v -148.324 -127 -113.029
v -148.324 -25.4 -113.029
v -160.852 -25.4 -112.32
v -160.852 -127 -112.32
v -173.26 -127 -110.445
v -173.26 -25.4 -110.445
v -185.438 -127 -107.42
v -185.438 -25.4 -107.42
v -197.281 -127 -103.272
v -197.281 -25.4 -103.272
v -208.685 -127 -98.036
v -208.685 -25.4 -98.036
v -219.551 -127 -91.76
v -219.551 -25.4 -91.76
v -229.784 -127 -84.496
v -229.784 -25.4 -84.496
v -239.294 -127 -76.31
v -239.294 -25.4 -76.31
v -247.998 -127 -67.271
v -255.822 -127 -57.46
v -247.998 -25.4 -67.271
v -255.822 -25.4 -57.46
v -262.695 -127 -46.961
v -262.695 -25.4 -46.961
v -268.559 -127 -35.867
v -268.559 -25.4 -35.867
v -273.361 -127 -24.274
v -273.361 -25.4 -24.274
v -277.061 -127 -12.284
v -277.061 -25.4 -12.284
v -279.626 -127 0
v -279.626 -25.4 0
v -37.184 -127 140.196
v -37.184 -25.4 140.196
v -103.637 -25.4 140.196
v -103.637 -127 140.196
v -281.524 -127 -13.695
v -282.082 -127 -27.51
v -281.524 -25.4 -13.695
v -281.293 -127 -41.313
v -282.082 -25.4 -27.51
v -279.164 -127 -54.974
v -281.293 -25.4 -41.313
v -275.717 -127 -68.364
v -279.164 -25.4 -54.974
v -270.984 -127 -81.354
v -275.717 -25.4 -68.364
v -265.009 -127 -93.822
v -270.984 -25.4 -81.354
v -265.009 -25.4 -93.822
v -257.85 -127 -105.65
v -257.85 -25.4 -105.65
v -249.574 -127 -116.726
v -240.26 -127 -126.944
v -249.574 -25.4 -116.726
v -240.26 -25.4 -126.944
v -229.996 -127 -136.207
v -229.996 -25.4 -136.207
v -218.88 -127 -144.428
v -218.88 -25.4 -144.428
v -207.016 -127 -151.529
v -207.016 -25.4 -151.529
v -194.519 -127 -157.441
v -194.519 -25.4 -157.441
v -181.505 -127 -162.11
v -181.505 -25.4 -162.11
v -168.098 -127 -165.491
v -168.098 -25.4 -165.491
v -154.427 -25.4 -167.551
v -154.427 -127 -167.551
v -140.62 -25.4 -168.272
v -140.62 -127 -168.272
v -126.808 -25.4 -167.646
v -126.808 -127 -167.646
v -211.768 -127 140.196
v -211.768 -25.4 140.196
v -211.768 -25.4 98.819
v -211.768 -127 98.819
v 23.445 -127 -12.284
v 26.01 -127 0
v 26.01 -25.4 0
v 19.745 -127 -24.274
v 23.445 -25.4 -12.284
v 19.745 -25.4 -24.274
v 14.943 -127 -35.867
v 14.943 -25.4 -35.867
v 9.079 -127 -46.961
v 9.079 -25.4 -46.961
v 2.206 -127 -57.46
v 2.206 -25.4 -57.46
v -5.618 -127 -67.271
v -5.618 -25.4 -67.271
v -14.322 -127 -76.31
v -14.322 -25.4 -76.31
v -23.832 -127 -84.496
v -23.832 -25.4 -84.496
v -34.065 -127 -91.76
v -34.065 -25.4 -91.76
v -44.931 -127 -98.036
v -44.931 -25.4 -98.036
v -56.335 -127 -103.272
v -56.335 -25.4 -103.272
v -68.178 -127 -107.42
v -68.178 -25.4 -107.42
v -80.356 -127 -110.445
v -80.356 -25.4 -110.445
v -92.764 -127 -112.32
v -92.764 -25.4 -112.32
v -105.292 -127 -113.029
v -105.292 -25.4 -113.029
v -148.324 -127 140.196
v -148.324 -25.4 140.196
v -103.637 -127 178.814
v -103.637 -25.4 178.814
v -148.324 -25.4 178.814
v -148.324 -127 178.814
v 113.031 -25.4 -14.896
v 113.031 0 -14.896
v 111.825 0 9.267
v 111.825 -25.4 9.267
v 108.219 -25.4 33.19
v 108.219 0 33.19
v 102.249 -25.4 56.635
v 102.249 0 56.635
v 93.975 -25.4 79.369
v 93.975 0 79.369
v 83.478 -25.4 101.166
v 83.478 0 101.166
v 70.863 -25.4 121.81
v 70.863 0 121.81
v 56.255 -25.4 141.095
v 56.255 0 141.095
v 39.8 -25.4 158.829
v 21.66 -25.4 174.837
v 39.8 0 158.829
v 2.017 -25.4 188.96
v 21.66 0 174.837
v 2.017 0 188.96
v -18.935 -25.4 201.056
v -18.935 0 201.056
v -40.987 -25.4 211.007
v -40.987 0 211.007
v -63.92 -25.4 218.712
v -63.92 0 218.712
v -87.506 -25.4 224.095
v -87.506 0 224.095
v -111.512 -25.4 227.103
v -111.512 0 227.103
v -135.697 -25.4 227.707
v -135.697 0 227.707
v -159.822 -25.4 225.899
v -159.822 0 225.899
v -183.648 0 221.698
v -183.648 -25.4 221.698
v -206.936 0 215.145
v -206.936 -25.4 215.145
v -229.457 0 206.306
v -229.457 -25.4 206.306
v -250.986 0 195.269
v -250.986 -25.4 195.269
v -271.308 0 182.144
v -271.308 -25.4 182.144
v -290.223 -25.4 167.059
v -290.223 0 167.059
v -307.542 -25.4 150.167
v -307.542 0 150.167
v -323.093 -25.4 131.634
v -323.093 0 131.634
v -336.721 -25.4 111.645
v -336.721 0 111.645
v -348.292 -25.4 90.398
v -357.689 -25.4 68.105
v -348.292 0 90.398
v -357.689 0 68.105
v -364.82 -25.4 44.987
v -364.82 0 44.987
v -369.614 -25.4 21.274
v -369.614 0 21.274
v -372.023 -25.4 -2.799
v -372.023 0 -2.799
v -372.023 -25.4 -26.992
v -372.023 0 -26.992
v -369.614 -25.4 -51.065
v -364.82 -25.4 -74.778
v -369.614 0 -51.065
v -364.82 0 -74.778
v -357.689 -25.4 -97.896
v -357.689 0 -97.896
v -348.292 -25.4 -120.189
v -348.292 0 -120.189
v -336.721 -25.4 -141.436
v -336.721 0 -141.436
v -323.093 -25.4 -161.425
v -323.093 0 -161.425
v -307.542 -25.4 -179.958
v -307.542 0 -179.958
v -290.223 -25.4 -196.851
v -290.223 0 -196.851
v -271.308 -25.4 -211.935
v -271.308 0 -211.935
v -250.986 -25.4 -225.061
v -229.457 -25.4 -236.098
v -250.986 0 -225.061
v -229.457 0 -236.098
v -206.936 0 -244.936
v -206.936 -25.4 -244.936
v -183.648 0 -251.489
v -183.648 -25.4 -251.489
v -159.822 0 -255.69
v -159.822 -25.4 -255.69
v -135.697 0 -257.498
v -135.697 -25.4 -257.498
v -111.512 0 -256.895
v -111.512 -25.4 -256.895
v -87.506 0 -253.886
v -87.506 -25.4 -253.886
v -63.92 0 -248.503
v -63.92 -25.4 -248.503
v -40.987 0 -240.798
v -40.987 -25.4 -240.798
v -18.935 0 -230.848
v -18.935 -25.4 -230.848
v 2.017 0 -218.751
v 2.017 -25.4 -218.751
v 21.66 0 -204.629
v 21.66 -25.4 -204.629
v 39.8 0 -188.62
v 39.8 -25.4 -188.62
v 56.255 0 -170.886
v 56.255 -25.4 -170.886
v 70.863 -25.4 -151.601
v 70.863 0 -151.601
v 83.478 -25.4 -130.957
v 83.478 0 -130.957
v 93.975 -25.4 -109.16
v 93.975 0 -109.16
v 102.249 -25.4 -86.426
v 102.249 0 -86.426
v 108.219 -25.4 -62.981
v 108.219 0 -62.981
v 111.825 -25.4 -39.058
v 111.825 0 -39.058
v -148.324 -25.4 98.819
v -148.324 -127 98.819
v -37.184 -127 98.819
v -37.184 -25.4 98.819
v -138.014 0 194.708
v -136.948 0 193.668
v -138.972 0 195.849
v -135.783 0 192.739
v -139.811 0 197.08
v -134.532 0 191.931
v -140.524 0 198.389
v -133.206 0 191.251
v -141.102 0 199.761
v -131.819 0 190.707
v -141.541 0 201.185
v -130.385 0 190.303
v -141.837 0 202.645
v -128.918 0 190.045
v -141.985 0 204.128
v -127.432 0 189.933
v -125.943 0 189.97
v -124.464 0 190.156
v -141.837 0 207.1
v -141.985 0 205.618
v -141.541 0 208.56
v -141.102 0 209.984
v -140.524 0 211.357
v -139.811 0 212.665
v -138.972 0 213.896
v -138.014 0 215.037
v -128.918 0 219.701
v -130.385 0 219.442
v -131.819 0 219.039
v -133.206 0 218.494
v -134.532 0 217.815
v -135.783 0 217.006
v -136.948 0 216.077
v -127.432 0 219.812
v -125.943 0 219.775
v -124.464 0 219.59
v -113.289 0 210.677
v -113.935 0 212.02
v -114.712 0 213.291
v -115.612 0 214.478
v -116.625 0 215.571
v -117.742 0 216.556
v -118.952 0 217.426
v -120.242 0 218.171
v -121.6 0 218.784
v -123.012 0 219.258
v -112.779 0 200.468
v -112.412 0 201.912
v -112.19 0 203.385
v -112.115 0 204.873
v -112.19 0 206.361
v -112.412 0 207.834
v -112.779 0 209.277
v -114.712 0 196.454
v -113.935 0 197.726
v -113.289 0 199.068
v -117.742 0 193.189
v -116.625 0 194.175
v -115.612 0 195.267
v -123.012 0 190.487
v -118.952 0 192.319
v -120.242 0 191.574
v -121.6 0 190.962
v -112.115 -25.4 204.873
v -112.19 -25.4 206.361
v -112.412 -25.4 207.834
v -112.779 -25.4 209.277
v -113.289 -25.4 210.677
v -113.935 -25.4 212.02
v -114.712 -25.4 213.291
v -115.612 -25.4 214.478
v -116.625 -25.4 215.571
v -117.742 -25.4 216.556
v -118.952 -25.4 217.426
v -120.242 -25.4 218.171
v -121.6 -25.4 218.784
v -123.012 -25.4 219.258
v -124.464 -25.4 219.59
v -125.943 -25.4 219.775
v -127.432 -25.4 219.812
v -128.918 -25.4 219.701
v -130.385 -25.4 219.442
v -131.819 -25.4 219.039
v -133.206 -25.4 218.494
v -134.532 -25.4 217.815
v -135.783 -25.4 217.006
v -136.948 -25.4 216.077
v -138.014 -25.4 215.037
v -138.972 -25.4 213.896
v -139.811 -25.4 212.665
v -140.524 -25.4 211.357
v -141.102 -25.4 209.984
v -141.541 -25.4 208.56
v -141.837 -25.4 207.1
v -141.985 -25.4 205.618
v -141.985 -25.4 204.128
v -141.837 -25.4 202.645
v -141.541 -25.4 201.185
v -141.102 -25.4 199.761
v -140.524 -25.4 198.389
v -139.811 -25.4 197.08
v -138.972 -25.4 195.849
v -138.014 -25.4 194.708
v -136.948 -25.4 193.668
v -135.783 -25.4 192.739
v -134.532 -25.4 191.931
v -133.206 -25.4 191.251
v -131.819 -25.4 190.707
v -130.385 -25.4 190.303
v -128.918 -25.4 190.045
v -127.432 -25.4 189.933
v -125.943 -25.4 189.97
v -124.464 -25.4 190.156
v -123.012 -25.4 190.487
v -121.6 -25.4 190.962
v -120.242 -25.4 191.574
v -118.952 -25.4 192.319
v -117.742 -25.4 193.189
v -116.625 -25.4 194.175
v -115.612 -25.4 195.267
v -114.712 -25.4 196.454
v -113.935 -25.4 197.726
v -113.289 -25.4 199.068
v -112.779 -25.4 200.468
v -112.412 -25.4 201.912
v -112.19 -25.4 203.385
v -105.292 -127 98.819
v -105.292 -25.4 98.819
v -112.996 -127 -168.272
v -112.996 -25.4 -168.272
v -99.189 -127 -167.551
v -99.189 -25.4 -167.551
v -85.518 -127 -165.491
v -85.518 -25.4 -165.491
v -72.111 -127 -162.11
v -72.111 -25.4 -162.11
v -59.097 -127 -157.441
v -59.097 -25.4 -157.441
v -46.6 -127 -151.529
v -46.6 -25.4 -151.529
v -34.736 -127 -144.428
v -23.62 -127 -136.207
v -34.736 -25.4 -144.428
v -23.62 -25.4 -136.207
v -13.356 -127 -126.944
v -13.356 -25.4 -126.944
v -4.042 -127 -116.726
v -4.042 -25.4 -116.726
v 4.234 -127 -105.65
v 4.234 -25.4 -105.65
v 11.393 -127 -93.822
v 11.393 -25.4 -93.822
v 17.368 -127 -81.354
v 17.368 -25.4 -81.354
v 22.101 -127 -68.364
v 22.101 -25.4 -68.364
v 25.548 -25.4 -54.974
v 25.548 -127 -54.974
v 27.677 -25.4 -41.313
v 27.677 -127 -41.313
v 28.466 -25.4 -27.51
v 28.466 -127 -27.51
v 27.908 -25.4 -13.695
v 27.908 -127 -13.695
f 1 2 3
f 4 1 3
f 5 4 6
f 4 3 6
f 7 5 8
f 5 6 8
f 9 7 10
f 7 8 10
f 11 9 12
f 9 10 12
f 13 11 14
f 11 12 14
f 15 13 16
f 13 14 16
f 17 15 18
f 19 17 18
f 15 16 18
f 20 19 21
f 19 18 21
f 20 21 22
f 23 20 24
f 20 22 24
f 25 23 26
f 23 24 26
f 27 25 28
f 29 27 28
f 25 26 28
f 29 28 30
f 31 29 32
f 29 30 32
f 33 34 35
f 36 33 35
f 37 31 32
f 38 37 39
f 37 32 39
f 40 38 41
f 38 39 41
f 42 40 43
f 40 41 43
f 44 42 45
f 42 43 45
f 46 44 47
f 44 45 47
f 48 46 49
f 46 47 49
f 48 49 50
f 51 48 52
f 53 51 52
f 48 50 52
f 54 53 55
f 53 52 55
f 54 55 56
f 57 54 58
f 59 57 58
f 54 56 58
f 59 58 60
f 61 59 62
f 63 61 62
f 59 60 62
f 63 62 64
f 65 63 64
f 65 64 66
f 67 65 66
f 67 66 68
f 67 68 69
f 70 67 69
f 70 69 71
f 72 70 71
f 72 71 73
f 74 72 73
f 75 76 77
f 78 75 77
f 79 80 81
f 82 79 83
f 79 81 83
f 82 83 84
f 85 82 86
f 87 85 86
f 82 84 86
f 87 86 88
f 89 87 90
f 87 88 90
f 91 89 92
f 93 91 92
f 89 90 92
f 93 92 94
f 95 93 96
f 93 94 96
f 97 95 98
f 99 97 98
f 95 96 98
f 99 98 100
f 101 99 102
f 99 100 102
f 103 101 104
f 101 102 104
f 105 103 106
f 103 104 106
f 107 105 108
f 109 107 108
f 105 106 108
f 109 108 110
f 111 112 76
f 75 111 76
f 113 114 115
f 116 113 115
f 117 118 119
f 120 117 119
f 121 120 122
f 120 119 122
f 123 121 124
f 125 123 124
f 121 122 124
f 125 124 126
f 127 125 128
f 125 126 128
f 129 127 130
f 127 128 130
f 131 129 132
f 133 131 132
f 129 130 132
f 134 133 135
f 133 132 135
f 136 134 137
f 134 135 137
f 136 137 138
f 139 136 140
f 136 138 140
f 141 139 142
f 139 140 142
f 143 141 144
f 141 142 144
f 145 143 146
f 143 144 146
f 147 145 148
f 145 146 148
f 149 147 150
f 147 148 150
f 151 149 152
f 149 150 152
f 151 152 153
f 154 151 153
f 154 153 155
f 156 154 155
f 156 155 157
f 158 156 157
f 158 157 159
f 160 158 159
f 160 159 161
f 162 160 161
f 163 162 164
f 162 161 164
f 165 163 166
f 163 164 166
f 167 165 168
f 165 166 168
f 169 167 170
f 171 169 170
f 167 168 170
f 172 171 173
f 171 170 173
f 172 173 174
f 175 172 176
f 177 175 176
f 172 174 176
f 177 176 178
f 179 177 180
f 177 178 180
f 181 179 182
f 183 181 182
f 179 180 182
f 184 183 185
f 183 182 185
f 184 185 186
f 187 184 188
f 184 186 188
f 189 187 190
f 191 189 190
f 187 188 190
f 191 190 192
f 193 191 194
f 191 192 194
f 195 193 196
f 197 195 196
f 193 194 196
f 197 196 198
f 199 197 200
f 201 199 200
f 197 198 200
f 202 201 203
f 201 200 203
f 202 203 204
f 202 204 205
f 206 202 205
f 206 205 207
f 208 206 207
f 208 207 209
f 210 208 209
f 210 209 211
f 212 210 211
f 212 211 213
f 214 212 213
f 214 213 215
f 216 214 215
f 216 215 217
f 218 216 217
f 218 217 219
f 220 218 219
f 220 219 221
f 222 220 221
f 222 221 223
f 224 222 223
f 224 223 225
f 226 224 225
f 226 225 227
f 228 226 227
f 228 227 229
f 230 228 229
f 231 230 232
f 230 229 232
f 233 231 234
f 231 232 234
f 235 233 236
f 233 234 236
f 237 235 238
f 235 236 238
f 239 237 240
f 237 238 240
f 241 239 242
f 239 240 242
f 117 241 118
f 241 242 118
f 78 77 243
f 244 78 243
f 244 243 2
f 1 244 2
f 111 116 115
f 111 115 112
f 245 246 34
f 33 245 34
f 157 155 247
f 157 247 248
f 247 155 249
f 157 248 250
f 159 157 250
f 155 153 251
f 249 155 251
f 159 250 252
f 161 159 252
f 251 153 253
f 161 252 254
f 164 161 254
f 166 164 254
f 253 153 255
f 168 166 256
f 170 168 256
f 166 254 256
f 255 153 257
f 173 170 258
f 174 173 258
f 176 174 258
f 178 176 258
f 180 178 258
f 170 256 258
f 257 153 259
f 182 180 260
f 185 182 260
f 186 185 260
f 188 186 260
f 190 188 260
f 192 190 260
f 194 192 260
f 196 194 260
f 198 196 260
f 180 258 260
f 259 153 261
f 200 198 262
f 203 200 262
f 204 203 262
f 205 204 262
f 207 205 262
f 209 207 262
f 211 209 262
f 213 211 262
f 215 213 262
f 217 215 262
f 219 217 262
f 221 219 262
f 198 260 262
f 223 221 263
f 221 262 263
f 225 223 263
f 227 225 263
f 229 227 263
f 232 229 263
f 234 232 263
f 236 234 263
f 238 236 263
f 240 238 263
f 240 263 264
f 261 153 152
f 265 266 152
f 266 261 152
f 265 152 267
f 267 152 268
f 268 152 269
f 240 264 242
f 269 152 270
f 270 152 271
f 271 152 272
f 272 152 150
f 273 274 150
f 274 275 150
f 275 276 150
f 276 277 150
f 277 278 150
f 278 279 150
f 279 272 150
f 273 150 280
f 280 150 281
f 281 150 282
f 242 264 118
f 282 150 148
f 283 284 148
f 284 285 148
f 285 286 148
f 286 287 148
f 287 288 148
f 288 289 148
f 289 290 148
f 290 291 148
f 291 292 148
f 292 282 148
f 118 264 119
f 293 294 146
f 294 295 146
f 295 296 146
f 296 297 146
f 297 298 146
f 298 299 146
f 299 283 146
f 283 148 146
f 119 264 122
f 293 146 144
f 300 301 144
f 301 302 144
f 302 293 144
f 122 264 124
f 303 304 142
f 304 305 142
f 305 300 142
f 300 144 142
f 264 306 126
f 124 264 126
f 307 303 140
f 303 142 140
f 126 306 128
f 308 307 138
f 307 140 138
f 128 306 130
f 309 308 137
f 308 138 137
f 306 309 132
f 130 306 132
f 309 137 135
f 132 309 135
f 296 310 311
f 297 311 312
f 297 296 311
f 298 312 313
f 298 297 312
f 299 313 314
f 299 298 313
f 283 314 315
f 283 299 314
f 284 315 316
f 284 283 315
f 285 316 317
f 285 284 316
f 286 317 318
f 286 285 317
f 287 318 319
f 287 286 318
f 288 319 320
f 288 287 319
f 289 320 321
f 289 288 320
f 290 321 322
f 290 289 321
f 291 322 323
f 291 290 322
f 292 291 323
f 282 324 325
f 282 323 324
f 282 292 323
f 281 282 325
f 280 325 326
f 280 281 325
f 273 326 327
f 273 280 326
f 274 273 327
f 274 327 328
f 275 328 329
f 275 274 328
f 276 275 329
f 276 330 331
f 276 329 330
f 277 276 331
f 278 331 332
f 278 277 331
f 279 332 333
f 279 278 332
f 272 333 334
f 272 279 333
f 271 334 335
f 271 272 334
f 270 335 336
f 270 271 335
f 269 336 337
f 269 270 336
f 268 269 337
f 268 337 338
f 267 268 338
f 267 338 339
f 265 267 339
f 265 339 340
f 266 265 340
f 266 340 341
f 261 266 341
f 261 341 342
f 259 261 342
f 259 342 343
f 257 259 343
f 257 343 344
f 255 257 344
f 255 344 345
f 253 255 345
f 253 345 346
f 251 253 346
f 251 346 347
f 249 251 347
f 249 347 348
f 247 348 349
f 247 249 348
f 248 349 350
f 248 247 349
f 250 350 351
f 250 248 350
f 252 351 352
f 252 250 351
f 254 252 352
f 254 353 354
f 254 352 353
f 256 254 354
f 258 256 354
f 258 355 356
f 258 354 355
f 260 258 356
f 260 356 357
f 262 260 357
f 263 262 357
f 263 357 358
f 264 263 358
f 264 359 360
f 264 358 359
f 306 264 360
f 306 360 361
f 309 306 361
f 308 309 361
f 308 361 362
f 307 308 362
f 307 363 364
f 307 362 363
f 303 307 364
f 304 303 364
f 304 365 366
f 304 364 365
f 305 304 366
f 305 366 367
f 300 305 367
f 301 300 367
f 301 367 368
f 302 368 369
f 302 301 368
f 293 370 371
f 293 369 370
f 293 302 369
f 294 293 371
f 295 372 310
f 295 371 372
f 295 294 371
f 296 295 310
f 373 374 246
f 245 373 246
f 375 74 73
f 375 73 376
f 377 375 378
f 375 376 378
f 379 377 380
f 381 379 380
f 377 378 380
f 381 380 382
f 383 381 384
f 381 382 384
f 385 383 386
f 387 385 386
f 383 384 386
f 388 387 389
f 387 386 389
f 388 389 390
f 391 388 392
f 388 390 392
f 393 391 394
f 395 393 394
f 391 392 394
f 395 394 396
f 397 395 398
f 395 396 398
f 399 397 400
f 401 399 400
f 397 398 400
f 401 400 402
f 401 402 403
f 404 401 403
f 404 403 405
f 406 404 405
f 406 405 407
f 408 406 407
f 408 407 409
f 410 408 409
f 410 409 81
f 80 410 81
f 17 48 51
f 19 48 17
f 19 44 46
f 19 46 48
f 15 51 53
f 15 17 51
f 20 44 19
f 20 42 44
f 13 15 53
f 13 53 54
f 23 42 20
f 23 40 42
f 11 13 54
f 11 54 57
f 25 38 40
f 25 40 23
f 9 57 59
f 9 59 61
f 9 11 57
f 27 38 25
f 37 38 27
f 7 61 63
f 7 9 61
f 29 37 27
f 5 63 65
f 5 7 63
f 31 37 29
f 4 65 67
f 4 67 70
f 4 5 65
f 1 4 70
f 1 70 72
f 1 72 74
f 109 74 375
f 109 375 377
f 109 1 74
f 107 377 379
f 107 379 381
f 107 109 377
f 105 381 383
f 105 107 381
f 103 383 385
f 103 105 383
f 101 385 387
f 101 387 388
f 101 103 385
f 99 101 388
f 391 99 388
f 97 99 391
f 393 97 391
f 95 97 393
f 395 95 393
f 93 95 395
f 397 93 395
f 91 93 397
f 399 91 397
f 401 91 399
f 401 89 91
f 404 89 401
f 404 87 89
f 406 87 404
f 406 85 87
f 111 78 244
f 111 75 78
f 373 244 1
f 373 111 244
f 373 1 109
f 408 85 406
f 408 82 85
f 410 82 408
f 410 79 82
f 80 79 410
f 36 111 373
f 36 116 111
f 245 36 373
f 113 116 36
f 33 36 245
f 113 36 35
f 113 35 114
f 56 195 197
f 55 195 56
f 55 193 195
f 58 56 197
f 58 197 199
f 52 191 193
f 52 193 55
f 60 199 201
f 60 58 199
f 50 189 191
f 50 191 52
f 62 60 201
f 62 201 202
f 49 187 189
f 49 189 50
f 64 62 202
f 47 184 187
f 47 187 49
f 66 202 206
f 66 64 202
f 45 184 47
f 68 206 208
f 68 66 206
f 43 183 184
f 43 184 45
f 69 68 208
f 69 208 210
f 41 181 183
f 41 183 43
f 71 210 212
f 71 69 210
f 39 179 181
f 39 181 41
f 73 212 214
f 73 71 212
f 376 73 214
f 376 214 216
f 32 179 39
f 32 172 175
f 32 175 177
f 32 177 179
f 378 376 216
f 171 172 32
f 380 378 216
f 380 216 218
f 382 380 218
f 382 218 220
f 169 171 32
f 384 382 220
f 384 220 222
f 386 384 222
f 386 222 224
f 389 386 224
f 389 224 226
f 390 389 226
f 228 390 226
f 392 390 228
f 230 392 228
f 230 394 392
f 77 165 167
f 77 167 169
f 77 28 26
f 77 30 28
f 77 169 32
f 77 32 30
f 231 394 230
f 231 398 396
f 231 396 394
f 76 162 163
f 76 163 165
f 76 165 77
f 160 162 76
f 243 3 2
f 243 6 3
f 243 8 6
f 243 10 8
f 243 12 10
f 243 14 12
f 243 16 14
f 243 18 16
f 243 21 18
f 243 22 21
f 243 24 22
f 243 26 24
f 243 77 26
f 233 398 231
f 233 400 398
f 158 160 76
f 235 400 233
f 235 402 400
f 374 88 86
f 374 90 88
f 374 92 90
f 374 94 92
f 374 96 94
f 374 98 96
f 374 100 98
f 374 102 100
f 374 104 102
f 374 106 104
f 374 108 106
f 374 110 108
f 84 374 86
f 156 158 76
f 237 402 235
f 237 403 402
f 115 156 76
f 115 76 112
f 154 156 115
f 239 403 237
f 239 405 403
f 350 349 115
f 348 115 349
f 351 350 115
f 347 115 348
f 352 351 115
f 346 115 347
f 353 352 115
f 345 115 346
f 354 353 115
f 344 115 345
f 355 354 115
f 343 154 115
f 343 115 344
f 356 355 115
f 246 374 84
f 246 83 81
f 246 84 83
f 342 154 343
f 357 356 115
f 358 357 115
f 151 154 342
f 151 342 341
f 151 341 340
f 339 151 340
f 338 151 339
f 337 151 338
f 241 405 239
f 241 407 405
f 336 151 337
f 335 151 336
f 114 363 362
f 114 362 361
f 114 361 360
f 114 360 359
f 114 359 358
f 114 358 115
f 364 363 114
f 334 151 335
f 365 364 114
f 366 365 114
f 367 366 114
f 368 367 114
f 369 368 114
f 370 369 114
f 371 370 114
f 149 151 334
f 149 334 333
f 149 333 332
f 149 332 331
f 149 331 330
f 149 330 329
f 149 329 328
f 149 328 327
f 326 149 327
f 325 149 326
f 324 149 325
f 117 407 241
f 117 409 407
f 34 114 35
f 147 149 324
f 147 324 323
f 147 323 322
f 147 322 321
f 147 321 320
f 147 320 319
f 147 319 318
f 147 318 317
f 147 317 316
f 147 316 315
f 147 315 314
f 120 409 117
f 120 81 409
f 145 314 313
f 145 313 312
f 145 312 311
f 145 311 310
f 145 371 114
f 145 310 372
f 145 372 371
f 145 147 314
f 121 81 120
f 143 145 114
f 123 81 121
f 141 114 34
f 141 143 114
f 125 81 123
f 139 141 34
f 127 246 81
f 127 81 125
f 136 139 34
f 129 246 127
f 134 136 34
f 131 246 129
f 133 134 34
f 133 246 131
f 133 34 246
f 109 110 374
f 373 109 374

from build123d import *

# Parameters (mm, degrees)
F1_DEPTH = 127
F2_R     = 242.677577
F3_DEPTH = 25.4
F4_R     = 14.944068
F5_DEPTH = 25.4
F6_DEPTH = 25.4
F7_DEPTH = 127.001


with BuildPart() as f1:
    # F0 (on Front) → F1 (new body)
    with BuildSketch(Plane.XZ):
        with BuildLine():
            Line((-211.768046, 98.819412), (-148.323849, 98.819412))
            Line((-148.323849, 98.819412), (-148.323849, -113.029018))
            ThreePointArc((-148.323849, -113.029018), (-234.634399, -80.514054), (-279.625744, 0))
            ThreePointArc((-279.625744, 0), (-245.041574, -121.948367), (-126.808003, -167.646199))
            ThreePointArc((-126.808003, -167.646199), (-8.574432, -121.948367), (26.009738, 0))
            ThreePointArc((26.009738, 0), (-18.981606, -80.514054), (-105.292156, -113.029018))
            Line((-105.292156, -113.029018), (-105.292156, 98.819412))
            Line((-105.292156, 98.819412), (-37.183784, 98.819412))
            Line((-37.183784, 98.819412), (-37.183784, 140.196055))
            Line((-37.183784, 140.196055), (-103.637077, 140.196055))
            Line((-103.637077, 140.196055), (-103.637077, 178.814262))
            Line((-103.637077, 178.814262), (-148.323849, 178.814262))
            Line((-148.323849, 178.814262), (-148.323849, 140.196055))
            Line((-148.323849, 140.196055), (-211.768046, 140.196055))
            Line((-211.768046, 140.196055), (-211.768046, 98.819412))
        make_face()
    extrude(amount=F1_DEPTH)

    # F2 (on Front) → F3 (join)
    with BuildSketch(Plane.XZ):
        with Locations((-129.646823, -14.895595)):
            Circle(F2_R)
    extrude(amount=F3_DEPTH)

    # F4 (on Front) → F5 (join)
    with BuildSketch(Plane.XZ):
        with Locations((-127.059489, 204.872638)):
            Circle(F4_R)
    extrude(amount=F5_DEPTH)

    # F4 (on Front) → F6 (join)
    with BuildSketch(Plane.XZ):
        with Locations((-127.059489, 204.872638)):
            Circle(F4_R)
    extrude(amount=F6_DEPTH)

    # F4 (on Front) → F7 (cut, through all)
    with BuildSketch(Plane.XZ):
        with Locations((-127.059489, 204.872638)):
            Circle(F4_R)
    extrude(amount=F7_DEPTH, mode=Mode.SUBTRACT)


solid = f1.part
